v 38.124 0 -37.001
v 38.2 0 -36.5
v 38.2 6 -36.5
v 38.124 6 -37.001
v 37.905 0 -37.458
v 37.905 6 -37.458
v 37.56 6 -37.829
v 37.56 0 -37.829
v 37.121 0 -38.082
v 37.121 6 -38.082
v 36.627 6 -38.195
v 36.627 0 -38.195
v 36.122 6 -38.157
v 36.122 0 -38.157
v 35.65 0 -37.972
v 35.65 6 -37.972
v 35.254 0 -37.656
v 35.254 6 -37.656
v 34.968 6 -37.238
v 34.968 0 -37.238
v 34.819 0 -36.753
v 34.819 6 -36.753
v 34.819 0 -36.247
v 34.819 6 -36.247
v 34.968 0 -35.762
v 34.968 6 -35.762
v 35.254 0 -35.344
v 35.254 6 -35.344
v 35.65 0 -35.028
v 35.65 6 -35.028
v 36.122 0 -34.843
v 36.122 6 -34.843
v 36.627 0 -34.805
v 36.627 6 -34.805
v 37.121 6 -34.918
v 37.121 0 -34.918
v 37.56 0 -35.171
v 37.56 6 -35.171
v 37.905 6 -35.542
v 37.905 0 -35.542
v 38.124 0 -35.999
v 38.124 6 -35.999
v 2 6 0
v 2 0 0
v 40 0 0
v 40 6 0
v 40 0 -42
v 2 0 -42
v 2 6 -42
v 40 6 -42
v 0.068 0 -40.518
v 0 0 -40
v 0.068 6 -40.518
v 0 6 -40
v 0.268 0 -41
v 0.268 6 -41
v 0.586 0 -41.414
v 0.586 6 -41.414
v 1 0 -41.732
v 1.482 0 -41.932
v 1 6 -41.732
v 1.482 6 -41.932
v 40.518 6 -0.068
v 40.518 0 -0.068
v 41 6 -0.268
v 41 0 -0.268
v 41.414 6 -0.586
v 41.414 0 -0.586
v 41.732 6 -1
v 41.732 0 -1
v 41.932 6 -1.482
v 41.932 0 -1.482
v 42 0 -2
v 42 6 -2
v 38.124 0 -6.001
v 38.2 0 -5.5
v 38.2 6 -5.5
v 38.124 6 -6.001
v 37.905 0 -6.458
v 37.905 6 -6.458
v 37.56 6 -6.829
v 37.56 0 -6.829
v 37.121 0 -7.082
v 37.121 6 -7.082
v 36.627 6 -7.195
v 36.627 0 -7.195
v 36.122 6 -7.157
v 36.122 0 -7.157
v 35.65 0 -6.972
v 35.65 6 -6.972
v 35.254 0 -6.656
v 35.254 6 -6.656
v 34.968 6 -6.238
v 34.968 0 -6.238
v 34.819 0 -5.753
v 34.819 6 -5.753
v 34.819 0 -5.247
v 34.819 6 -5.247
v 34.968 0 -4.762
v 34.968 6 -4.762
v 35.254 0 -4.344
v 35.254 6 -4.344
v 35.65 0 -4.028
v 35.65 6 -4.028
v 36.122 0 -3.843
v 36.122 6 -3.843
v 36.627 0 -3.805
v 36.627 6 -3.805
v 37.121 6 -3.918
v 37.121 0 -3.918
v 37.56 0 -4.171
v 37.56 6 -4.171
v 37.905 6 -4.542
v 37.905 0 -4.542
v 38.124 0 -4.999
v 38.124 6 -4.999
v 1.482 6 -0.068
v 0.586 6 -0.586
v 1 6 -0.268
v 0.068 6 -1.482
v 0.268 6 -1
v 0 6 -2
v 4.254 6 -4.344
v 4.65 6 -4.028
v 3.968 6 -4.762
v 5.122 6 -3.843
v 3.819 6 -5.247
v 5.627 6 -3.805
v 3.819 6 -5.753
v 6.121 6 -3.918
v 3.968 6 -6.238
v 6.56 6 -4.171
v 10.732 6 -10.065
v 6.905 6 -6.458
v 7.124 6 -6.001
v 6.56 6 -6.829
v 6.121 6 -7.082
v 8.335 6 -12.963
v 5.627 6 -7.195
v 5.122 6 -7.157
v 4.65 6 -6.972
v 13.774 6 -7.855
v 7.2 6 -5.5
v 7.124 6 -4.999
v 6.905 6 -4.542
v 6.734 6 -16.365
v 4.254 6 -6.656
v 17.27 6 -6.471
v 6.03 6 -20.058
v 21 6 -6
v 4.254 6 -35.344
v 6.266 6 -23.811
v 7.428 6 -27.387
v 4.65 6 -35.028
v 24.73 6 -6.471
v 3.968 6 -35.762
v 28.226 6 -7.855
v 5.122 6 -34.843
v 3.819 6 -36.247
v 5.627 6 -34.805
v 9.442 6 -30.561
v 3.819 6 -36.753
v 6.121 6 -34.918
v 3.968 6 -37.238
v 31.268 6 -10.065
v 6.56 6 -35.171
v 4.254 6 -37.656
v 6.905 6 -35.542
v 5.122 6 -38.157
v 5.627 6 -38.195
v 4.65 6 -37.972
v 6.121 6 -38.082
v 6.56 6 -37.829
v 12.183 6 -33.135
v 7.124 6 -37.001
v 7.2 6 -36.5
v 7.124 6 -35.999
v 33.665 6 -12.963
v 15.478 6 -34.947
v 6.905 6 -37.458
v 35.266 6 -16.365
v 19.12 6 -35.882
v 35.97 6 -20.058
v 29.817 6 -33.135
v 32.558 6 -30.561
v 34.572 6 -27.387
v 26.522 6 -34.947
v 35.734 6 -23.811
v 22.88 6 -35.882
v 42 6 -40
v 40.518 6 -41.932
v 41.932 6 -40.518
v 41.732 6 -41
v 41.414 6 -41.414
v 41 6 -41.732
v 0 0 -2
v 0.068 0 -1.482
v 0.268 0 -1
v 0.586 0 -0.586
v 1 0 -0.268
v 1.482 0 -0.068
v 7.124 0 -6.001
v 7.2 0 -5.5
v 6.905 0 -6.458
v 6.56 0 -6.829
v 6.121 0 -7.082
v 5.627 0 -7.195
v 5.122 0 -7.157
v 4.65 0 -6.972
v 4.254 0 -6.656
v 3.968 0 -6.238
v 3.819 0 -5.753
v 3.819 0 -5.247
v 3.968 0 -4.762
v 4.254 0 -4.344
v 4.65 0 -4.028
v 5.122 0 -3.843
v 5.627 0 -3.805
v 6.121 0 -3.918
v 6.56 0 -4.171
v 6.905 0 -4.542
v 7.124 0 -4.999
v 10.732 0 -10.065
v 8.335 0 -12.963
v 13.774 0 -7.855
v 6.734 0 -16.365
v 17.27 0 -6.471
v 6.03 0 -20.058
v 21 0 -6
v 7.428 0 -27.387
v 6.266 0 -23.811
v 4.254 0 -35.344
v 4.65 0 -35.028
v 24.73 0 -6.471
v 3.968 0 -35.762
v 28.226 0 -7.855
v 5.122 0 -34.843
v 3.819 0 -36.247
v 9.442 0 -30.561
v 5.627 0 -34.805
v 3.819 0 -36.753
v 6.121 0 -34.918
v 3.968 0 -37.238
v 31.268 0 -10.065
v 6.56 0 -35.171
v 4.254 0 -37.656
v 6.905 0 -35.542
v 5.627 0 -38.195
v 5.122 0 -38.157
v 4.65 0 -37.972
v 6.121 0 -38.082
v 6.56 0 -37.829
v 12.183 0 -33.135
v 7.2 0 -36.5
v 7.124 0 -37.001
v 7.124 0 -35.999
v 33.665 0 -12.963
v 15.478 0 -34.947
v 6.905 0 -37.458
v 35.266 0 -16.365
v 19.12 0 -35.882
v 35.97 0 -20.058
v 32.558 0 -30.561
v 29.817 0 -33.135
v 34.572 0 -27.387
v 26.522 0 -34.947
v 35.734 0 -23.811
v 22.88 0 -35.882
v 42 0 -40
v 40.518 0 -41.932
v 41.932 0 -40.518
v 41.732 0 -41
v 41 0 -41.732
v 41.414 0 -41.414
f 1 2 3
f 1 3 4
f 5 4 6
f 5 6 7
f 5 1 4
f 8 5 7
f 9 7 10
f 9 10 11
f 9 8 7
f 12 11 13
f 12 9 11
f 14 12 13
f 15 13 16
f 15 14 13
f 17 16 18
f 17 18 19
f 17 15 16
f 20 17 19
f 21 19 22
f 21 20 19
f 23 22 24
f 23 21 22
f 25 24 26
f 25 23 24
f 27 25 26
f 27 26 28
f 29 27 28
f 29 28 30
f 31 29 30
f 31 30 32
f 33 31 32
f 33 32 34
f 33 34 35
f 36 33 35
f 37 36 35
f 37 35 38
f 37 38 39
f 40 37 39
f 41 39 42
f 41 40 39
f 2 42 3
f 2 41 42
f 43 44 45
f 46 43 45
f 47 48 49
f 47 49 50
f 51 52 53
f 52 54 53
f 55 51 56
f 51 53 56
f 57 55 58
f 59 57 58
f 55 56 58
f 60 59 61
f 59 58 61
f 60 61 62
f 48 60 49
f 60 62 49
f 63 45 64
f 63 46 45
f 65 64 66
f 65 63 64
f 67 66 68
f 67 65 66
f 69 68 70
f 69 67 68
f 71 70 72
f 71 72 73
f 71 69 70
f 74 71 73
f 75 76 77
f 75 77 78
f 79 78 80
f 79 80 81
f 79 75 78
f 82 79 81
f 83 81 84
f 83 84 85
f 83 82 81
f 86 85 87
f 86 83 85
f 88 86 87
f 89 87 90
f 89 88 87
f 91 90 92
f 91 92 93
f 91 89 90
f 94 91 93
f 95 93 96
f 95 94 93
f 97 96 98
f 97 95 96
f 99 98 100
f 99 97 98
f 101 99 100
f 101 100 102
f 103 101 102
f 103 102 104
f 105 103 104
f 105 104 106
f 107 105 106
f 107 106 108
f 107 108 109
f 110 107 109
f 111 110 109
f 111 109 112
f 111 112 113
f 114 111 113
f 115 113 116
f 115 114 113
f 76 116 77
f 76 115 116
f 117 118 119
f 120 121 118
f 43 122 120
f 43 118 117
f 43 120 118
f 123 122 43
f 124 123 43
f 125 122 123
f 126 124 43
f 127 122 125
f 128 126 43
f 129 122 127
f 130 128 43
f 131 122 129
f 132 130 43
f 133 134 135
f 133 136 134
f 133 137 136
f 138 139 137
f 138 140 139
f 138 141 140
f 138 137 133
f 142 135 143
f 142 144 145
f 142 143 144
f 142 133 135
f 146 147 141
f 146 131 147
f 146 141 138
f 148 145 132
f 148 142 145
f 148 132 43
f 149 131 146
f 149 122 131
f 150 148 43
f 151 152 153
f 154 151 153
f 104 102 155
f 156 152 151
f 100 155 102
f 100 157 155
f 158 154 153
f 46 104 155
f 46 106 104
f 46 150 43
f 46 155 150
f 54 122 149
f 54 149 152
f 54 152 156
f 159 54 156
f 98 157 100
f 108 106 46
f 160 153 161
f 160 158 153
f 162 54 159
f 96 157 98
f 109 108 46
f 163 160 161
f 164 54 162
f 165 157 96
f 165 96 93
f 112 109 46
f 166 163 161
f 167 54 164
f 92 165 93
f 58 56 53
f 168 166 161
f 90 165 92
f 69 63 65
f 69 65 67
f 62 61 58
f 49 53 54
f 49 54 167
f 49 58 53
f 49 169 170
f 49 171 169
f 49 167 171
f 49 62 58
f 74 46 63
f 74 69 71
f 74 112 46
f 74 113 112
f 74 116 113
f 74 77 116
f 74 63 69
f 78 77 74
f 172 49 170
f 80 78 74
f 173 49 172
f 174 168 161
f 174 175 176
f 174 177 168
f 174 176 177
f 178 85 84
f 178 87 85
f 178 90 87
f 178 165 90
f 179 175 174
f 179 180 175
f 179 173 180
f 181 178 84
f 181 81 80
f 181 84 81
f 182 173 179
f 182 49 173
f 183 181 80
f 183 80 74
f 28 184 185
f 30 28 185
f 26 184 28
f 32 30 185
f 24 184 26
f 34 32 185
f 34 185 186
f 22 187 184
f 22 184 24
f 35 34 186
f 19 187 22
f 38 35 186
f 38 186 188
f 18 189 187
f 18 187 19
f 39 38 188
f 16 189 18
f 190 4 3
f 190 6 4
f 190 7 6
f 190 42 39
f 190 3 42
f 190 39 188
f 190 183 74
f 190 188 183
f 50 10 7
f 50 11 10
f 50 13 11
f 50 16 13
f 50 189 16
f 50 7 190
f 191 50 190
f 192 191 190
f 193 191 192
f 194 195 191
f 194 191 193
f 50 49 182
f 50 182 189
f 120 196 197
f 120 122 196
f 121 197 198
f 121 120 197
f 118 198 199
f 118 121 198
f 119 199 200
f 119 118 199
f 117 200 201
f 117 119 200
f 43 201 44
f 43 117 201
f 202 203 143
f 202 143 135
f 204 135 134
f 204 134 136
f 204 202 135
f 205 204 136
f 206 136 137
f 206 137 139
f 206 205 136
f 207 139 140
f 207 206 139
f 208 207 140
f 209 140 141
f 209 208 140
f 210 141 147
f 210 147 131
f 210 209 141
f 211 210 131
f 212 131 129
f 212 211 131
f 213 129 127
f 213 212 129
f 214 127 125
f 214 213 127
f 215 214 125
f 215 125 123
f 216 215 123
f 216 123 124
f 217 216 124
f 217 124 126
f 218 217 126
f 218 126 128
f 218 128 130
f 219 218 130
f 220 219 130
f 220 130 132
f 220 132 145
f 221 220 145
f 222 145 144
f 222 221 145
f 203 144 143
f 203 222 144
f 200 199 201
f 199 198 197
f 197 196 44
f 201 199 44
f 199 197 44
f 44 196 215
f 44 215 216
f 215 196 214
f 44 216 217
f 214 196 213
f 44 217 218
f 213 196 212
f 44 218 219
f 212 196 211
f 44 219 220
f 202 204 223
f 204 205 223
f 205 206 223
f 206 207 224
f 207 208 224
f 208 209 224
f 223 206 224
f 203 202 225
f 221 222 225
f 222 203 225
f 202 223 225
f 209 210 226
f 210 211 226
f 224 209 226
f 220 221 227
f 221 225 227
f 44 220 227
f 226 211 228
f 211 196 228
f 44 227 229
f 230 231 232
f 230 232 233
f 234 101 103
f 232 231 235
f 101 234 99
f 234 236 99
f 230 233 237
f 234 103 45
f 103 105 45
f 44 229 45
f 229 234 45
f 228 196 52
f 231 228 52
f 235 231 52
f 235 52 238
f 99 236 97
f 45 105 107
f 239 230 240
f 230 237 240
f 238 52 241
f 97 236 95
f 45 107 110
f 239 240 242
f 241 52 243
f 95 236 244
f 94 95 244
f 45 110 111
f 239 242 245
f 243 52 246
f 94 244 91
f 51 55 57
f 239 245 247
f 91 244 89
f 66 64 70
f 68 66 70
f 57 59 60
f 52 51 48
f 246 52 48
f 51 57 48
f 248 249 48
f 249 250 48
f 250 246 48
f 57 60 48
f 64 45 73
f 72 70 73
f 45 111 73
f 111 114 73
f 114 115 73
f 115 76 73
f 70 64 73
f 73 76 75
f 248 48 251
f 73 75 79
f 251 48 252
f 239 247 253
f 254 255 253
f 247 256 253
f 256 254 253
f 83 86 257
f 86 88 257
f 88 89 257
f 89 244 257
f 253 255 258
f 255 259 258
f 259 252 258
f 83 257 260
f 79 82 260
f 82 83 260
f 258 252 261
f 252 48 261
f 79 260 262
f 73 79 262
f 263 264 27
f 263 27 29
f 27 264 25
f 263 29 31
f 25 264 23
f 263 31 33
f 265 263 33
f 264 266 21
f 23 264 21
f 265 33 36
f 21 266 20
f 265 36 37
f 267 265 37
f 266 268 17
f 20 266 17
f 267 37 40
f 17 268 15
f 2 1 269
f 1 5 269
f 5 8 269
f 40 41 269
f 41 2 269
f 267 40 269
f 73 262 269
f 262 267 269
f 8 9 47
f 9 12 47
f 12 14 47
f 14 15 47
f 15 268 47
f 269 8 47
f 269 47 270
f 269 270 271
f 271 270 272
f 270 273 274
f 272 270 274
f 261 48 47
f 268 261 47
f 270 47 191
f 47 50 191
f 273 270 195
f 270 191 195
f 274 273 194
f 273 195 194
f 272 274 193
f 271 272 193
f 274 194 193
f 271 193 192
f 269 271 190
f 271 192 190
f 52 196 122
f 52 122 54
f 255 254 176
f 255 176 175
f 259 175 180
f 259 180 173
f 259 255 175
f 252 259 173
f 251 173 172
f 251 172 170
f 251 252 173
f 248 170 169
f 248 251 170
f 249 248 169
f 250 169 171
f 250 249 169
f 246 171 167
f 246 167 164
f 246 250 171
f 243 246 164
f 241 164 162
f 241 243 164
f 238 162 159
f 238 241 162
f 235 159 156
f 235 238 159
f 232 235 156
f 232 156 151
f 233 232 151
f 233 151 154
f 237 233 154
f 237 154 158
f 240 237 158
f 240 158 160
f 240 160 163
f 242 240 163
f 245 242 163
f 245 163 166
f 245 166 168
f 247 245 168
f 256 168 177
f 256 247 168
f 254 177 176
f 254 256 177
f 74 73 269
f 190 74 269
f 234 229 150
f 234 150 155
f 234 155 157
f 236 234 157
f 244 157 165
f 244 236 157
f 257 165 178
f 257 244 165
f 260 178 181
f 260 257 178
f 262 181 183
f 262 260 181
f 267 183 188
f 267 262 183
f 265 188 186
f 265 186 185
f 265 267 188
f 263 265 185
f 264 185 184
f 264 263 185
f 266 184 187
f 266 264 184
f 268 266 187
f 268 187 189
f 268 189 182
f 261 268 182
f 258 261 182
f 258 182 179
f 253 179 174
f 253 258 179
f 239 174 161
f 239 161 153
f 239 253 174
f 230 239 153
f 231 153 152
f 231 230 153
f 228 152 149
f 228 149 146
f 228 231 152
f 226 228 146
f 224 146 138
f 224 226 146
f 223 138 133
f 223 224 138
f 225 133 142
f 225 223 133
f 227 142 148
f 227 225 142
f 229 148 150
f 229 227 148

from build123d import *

# Parameters (mm, degrees)
SKETCH_1_W                 = 42
SKETCH_1_H                 = 42
SKETCH_1_R                 = 15
EXTRUDE_1_DEPTH            = 6
FILLET_1_R                 = 2
HOLE_WIZARD_M3_1_OUTLINE_R = 1.7
HOLE_WIZARD_M3_1_DEPTH     = 6


# Read off the part's stored shape, not the designer's step: M3 间隙孔1
with BuildPart() as part:
    # 草图1 → 凸台-拉伸1 (new body)
    with BuildSketch(Plane(origin=(0, 0, 0), x_dir=(1, 0, 0), z_dir=(0, 1, 0))):
        with Locations((21, 21)):
            Rectangle(SKETCH_1_W, SKETCH_1_H)
        with Locations(Location((21, 21, 0), (0, 0, 270))):
            Circle(SKETCH_1_R, mode=Mode.SUBTRACT)
    extrude(amount=EXTRUDE_1_DEPTH)

    # 圆角1
    fillet_1_edges = [part.edges().sort_by_distance(p)[0] for p in [
        (0, 3, -42),
        (42, 3, -42),
        (42, 3, 0),
        (0, 3, 0),
    ]]
    fillet(fillet_1_edges, radius=FILLET_1_R)

    # M3 间隙孔1 outline → M3 间隙孔1 (cut)
    with BuildSketch(Plane(origin=(0, 0, 0), x_dir=(1, 0, 0), z_dir=(0, 1, 0))):
        with Locations((36.5, 36.5)):
            Circle(HOLE_WIZARD_M3_1_OUTLINE_R)
        with Locations((5.5, 5.5)):
            Circle(HOLE_WIZARD_M3_1_OUTLINE_R)
        with Locations((36.5, 5.5)):
            Circle(HOLE_WIZARD_M3_1_OUTLINE_R)
        with Locations((5.5, 36.5)):
            Circle(HOLE_WIZARD_M3_1_OUTLINE_R)
    extrude(amount=HOLE_WIZARD_M3_1_DEPTH, mode=Mode.SUBTRACT)


solid = part.part
